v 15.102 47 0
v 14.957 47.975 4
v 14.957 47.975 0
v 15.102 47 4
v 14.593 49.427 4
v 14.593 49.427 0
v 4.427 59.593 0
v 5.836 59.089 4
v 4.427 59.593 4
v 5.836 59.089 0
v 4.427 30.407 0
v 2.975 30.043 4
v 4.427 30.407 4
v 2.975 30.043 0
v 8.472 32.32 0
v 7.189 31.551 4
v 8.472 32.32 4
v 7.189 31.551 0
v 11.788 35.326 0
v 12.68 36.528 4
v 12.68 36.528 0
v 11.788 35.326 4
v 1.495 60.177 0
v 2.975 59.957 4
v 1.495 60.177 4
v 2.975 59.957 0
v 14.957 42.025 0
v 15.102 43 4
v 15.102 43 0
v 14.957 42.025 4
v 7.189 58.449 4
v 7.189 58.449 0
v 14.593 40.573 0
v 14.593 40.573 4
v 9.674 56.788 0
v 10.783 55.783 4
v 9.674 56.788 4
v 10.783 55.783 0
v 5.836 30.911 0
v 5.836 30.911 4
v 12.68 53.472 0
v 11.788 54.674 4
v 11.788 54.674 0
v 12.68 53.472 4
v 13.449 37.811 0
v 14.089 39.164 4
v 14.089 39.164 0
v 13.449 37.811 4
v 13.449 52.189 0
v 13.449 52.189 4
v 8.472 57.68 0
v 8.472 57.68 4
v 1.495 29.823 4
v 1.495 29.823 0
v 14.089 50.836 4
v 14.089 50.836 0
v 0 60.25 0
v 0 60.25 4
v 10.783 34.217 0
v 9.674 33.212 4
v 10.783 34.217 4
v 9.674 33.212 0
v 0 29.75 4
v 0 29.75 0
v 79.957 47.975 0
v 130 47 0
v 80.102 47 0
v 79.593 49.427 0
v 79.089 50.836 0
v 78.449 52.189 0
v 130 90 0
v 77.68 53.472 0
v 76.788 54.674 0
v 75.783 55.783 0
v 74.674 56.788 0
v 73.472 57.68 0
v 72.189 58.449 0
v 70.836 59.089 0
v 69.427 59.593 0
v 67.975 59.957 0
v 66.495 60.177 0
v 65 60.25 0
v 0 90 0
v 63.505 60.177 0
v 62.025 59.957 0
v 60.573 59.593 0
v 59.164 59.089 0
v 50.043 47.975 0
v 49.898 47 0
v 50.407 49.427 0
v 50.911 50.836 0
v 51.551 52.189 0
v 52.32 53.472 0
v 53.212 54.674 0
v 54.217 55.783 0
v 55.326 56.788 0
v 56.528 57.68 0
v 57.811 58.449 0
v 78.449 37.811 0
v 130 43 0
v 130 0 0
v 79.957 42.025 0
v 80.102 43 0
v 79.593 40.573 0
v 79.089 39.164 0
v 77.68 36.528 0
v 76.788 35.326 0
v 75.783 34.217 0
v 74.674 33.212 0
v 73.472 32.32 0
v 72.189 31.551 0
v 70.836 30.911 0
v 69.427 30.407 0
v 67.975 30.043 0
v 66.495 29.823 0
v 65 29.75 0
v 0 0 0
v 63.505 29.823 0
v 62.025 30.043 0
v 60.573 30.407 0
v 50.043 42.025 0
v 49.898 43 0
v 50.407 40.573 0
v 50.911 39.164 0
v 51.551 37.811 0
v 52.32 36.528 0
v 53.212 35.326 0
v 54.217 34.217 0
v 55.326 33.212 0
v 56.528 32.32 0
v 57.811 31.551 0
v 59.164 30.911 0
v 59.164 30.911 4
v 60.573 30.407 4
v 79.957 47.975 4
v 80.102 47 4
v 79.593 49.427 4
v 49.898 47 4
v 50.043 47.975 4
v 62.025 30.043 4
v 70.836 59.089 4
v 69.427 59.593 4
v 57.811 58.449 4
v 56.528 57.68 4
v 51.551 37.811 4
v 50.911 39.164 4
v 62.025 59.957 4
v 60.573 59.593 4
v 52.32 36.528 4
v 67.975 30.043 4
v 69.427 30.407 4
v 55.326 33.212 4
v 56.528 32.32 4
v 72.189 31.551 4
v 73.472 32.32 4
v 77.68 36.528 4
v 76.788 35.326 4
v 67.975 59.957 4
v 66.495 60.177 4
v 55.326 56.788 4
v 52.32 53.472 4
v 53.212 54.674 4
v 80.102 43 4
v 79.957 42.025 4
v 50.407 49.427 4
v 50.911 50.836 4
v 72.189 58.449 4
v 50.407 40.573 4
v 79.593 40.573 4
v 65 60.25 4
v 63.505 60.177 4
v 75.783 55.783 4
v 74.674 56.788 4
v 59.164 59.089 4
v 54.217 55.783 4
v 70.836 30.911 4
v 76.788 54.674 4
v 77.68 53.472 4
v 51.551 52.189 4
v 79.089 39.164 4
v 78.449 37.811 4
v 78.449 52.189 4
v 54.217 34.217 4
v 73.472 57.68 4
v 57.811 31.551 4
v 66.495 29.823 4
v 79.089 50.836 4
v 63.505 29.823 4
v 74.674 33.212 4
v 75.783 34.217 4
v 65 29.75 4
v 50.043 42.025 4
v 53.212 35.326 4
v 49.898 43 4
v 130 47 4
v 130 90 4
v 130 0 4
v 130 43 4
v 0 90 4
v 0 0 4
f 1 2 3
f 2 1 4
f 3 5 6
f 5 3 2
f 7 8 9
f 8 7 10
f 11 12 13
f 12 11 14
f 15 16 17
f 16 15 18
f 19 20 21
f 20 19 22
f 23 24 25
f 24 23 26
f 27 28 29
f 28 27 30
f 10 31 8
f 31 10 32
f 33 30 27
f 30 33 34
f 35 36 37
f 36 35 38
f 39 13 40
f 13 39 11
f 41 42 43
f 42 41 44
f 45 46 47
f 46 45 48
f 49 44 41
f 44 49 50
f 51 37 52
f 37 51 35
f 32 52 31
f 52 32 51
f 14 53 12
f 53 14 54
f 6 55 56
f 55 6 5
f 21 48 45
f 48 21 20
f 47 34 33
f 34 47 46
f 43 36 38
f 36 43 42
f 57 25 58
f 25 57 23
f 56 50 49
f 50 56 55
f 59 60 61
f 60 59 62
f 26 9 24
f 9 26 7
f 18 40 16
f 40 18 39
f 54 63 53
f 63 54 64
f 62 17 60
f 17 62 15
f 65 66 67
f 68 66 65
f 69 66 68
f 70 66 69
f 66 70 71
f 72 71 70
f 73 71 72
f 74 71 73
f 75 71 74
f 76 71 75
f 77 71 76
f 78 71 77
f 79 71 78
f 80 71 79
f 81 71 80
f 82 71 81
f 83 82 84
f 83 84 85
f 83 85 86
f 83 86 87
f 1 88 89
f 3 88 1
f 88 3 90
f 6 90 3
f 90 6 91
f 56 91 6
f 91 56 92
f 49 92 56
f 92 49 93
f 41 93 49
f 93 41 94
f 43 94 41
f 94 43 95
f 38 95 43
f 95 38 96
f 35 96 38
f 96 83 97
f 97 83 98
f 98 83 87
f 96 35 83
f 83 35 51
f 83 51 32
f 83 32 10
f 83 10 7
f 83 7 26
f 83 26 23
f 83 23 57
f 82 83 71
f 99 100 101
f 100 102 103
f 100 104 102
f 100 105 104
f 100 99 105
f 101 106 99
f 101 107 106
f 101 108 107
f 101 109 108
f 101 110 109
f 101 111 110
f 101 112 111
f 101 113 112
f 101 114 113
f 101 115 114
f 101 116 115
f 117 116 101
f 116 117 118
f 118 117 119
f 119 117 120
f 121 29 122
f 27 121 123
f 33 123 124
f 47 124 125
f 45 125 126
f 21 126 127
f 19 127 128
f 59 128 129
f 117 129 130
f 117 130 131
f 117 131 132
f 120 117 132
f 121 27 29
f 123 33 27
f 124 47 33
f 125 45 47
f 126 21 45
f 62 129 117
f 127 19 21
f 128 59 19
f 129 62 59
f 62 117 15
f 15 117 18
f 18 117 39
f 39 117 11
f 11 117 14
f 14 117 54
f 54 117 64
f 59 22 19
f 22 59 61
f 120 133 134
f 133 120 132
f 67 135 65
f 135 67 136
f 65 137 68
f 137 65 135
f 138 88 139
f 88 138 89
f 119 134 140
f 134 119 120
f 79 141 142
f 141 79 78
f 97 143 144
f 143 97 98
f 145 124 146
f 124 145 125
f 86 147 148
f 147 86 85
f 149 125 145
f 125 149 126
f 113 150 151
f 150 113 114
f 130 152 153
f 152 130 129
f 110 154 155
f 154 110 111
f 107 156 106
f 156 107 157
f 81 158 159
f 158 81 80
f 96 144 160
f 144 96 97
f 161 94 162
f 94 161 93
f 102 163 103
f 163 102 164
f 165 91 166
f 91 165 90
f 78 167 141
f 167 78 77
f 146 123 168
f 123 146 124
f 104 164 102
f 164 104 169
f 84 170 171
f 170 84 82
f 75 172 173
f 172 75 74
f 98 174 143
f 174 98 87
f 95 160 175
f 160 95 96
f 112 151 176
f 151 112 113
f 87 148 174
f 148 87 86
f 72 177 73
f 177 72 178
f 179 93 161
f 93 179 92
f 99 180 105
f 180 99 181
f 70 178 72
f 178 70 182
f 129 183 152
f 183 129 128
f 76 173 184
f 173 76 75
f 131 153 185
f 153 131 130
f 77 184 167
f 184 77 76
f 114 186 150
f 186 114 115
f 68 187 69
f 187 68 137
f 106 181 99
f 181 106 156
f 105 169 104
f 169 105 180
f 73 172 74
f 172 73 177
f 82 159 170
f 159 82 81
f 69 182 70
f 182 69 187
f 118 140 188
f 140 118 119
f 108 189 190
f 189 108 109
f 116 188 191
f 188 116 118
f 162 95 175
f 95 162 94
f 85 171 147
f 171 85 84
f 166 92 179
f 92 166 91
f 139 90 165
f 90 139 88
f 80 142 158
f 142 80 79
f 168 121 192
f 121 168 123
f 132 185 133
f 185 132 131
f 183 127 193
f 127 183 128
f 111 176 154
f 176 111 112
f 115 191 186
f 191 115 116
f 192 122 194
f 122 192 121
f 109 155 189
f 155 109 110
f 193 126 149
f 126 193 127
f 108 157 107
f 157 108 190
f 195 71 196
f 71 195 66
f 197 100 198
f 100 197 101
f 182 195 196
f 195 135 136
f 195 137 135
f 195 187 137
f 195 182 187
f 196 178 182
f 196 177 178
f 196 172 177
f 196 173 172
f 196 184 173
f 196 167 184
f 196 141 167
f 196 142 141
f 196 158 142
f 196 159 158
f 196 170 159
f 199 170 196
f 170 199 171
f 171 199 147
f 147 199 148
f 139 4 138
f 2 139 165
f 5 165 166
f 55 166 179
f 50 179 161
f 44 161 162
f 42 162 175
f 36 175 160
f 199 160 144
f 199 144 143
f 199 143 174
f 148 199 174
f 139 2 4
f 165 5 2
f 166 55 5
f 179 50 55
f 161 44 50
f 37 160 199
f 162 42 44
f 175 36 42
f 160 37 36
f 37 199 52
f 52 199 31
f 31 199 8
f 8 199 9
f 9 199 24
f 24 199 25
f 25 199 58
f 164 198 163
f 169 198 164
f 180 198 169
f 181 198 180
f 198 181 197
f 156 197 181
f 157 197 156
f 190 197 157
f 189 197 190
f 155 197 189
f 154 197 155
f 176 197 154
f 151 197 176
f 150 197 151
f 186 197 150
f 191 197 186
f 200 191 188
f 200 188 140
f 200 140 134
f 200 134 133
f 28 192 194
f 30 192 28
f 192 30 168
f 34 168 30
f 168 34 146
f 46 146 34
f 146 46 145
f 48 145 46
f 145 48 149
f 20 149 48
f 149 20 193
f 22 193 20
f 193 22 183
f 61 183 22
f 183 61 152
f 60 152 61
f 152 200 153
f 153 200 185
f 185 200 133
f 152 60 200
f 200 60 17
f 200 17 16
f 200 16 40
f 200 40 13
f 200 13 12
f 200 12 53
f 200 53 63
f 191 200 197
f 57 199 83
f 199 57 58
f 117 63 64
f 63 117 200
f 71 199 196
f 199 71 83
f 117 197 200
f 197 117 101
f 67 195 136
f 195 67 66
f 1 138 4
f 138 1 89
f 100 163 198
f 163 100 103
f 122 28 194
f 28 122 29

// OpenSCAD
// Rack for six 50 mL conical (Falcon-type) tubes
// Print orientation: Upside down (walls up, holes in plate).
// After printing, flip over to stand on walls.

// --- Dimensions ---
// Plate dimensions
$plate_length = 130; // X
$plate_width = 90;   // Y
$plate_thickness = 4; // Z

// Hole specifications
$hole_diameter = 30.5;
$hole_count_x = 3;
$hole_count_y = 2;
$hole_spacing_x = 40; // Centre-to-centre
$hole_spacing_y = 40; // Centre-to-centre

// Wall specifications
$wall_length = 130;   // X
$wall_thickness = 4;  // Y
$wall_height = 70;    // Z (total height from bed)

// --- Configuration ---
$fn = 64; // Smooth curves for holes

// --- Main Build ---
difference() {
    // 1. The Base Plate
    // Lies on Z=0 to Z=4
    translate([0, 0, 0])
    cube([
        $plate_length,
        $plate_width,
        $plate_thickness
    ]);

    // 2. The Two Side Walls
    // They rise from the plate (Z=4) to Z=70.
    // They are flush with the long edges (Y = +/- $plate_width/2).
    // Wall thickness is in Y direction.
    
    // Left Wall (at Y = -45)
    // Position: Centered on the left edge of the plate.
    // Plate left edge is at Y = -45.
    // Wall extends from Y = -49 to Y = -45.
    translate([0, -$plate_width/2 - $wall_thickness/2, 0])
    cube([
        $wall_length,
        $wall_thickness,
        $wall_height
    ]);

    // Right Wall (at Y = +45)
    // Position: Centered on the right edge of the plate.
    // Plate right edge is at Y = +45.
    // Wall extends from Y = +45 to Y = +49.
    translate([0, $plate_width/2 - $wall_thickness/2, 0])
    cube([
        $wall_length,
        $wall_thickness,
        $wall_height
    ]);

    // 3. Cut the Holes
    // We cut through the entire assembly (plate + walls) to ensure tubes pass through.
    // We extend the cut slightly past the top of the walls to ensure clean removal.
    $cut_extension = 1; 
    
    // Calculate hole positions
    // X positions: -65, 0, 65 (since length is 130 and spacing is 40)
    // Y positions: -45, 45 (since width is 90 and spacing is 40)
    for (x = [-65, 0, 65]) {
        for (y = [-45, 45]) {
            translate([x, y])
            cylinder(
                h = $wall_height + $cut_extension,
                d = $hole_diameter,
                $fn = $fn
            );
        }
    }
}
